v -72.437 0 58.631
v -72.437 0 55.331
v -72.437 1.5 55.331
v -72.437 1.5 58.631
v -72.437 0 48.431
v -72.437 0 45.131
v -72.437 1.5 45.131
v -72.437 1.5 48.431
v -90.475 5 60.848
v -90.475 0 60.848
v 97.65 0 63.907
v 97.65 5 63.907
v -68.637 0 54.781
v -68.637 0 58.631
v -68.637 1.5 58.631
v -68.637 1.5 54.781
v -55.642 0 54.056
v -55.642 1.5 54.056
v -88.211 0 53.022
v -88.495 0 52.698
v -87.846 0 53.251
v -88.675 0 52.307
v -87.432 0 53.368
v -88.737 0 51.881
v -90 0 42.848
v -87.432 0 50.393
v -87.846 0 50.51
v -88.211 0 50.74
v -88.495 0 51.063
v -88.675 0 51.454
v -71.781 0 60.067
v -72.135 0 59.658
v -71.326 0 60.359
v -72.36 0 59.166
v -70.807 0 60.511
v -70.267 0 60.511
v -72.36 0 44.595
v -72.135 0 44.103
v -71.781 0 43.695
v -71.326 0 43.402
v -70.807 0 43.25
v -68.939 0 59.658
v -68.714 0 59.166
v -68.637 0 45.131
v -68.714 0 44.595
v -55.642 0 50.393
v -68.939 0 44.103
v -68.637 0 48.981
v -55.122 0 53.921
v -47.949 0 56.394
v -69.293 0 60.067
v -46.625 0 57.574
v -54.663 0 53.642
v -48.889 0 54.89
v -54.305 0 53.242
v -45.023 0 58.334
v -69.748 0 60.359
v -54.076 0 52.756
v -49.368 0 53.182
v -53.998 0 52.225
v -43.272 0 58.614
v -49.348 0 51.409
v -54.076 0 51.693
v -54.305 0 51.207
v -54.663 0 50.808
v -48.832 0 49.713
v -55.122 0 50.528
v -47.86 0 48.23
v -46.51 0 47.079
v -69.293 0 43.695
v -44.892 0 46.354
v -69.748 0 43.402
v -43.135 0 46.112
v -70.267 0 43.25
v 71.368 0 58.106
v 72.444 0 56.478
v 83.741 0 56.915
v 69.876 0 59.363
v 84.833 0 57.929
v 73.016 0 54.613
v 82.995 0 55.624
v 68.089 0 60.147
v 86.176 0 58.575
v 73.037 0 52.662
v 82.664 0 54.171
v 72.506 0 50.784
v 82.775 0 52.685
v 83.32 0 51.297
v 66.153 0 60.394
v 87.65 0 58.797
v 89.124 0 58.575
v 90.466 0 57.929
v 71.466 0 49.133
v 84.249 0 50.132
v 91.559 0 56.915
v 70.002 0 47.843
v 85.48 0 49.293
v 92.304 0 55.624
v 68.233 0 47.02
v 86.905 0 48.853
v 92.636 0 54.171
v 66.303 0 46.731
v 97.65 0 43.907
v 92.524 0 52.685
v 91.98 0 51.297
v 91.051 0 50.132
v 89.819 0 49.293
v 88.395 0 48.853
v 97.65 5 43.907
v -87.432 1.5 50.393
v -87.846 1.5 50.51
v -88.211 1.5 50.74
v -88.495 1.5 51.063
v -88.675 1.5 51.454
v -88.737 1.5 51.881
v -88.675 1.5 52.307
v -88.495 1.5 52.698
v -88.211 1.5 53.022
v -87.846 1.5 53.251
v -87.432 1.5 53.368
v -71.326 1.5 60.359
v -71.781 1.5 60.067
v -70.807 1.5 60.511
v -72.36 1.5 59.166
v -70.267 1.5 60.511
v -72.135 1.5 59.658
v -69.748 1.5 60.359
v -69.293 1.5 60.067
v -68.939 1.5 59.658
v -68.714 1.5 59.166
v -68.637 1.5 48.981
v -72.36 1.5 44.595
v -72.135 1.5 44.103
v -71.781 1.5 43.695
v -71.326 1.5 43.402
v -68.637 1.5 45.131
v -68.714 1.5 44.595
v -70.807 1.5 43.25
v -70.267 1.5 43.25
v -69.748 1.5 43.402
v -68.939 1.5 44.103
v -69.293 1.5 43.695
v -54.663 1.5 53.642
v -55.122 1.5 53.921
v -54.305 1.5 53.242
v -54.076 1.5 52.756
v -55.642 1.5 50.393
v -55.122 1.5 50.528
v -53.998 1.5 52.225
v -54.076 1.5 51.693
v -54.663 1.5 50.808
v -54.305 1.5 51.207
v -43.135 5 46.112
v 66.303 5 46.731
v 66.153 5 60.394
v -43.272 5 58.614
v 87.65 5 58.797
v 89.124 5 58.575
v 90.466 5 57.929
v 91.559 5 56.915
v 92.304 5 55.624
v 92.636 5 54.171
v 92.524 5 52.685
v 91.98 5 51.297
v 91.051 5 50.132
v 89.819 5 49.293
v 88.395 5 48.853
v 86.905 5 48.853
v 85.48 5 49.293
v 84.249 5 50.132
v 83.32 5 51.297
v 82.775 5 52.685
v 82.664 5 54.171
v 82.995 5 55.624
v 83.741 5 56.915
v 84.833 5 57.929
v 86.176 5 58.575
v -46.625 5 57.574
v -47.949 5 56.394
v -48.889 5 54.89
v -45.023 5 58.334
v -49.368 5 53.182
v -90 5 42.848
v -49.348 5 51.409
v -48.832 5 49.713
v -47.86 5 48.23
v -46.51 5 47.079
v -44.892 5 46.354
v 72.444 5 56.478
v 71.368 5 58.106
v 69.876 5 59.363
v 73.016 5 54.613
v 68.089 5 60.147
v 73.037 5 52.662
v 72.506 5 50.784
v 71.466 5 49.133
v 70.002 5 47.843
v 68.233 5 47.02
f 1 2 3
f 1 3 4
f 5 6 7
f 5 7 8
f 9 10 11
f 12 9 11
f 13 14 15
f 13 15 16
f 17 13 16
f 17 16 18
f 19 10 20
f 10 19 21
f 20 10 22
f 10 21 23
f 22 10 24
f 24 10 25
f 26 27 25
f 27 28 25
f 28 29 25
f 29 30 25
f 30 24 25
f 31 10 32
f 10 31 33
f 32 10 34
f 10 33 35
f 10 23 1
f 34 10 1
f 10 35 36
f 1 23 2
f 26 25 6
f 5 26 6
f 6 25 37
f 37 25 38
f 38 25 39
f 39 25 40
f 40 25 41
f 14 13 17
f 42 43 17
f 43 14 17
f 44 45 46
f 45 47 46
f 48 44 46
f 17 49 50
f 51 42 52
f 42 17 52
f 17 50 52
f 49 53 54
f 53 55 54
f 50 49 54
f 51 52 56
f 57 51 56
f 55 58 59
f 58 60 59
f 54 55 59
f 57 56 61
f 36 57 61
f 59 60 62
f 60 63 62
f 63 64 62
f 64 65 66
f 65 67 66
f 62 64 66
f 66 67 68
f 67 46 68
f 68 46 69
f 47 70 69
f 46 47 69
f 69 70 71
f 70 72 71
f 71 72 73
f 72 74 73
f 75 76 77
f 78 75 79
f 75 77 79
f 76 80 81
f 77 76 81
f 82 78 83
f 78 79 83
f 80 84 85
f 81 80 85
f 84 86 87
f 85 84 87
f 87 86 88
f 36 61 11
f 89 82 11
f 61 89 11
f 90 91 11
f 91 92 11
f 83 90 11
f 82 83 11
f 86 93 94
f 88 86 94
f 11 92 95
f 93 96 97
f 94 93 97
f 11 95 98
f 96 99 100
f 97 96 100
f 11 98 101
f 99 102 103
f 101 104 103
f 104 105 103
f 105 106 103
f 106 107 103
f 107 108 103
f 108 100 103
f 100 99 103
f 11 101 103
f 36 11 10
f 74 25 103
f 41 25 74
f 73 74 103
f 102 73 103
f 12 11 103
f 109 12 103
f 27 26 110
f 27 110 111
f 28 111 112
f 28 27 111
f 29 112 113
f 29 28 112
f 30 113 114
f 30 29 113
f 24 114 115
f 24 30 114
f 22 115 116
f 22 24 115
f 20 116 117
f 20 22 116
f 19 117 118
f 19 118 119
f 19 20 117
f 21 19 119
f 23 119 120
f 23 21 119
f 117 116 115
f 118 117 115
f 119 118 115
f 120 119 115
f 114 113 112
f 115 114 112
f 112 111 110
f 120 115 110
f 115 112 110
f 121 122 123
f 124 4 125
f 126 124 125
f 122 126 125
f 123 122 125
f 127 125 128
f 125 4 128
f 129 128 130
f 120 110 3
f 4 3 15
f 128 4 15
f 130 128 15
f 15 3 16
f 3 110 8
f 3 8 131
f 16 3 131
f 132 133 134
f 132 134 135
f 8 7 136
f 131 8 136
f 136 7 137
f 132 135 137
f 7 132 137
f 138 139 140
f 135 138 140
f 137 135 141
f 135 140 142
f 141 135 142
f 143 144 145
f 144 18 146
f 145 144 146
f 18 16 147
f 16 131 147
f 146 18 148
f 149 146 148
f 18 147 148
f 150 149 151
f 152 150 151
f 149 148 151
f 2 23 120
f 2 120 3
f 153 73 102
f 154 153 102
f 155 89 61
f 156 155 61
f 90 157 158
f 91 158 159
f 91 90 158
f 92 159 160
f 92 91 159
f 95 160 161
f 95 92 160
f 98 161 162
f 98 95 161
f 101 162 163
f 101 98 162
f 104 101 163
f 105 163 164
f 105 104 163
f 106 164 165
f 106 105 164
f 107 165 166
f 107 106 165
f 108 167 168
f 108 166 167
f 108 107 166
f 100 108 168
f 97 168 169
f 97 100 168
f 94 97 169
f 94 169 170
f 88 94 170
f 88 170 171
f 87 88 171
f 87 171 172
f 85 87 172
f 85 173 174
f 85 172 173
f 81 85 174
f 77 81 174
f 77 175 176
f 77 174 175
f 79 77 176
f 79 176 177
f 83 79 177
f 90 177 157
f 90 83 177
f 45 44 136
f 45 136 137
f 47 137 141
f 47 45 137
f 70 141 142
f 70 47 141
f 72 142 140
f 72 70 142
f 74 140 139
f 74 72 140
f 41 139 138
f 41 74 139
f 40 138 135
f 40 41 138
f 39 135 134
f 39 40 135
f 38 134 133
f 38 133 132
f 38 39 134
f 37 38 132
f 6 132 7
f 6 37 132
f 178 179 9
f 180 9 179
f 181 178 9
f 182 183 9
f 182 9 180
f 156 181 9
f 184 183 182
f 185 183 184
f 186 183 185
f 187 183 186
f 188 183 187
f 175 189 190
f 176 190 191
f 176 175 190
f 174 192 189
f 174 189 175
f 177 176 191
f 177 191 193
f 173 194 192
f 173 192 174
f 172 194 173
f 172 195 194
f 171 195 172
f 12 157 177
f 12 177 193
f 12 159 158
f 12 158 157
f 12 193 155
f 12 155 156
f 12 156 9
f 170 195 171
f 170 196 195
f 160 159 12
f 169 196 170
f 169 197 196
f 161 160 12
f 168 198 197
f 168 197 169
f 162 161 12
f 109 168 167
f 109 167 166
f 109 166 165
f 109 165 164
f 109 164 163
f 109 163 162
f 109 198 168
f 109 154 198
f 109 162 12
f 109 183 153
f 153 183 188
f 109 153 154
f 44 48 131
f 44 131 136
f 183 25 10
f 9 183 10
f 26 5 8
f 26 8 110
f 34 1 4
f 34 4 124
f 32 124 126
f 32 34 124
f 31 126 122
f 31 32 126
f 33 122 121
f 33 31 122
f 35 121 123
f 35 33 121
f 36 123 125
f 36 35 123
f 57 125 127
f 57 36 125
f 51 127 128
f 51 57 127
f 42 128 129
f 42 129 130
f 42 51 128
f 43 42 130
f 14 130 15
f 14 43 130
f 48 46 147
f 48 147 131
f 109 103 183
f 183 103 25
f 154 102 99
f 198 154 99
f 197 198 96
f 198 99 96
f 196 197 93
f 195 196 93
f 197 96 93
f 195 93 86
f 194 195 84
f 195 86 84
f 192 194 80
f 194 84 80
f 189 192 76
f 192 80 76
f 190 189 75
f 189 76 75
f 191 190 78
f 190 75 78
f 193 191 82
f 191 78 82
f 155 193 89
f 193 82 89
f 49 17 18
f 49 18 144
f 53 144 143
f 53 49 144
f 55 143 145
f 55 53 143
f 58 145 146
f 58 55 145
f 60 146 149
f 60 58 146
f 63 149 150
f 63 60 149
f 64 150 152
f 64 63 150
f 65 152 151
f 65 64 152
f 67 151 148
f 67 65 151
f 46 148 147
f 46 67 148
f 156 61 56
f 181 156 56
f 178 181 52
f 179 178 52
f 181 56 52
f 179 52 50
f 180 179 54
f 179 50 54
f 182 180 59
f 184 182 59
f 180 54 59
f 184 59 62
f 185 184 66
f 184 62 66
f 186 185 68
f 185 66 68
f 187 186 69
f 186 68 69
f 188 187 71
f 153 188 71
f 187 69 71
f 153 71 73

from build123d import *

# Parameters (mm, degrees)
BOSS_EXTRUDE1_DEPTH = 5
CUT_EXTRUDE1_DEPTH  = 1.5
CUT_EXTRUDE2_DEPTH  = 117.810049896
SKETCH1_11_R        = 5
CUT_EXTRUDE4_DEPTH  = 117.810049896


with BuildPart() as part:
    # Sketch1 → Boss-Extrude1 (new body)
    with BuildSketch(Plane(origin=(0, 0, 0), x_dir=(1, 0, 0), z_dir=(0, 1, 0))):
        Polygon((-89.9999746, -42.847712915), (-90.474893649, -60.847712915), (97.64978611, -63.907018624), (97.64978611, -43.907018893), align=None)
    extrude(amount=BOSS_EXTRUDE1_DEPTH)

    # Sketch1<7> → Cut-Extrude1 (cut)
    with BuildSketch(Plane(origin=(0, 0, 0), x_dir=(1, 0, 0), z_dir=(0, 1, 0))):
        with BuildLine():
            Line((-72.436927027, -45.130599461), (-72.436927027, -48.430599461))
            Line((-72.436927027, -48.430599461), (-87.431604768, -50.393286254))
            ThreePointArc((-87.431604768, -50.393286254), (-88.736927027, -51.880599461), (-87.431604768, -53.367912669))
            Line((-87.431604768, -53.367912669), (-72.436927027, -55.330599461))
            Line((-72.436927027, -55.330599461), (-72.436927027, -58.630599461))
            ThreePointArc((-72.436927027, -58.630599461), (-70.536927027, -60.530599461), (-68.636927027, -58.630599461))
            Line((-68.636927027, -58.630599461), (-68.636927027, -54.780599461))
            Line((-68.636927027, -54.780599461), (-55.641618403, -54.056431677))
            ThreePointArc((-55.641618403, -54.056431677), (-53.998192666, -52.22471247), (-55.641618403, -50.392993263))
            Line((-55.641618403, -50.392993263), (-68.636927027, -48.980599461))
            Line((-68.636927027, -48.980599461), (-68.636927027, -45.130599461))
            ThreePointArc((-68.636927027, -45.130599461), (-70.536927027, -43.230599461), (-72.436927027, -45.130599461))
        make_face()
    extrude(amount=CUT_EXTRUDE1_DEPTH, mode=Mode.SUBTRACT)

    # Sketch1<9> → Cut-Extrude2 (cut, through all)
    with BuildSketch(Plane(origin=(0, 0, 0), x_dir=(1, 0, 0), z_dir=(0, 1, 0))):
        with BuildLine():
            Line((-43.135065573, -46.112318891), (66.303161817, -46.73083337))
            ThreePointArc((66.303161817, -46.73083337), (73.096439635, -53.63791869), (66.153429754, -60.394424507))
            Line((66.153429754, -60.394424507), (-43.272048174, -58.614120743))
            ThreePointArc((-43.272048174, -58.614120743), (-49.421343824, -52.295091347), (-43.135065573, -46.112318891))
        make_face()
    extrude(amount=CUT_EXTRUDE2_DEPTH, mode=Mode.SUBTRACT)

    # Sketch1<11> → Cut-Extrude4 (cut, through all)
    with BuildSketch(Plane(origin=(0, 0, 0), x_dir=(1, 0, 0), z_dir=(0, 1, 0))):
        with Locations(Location((87.64978611, -53.797415464, 0), (0, 0, 270))):
            Circle(SKETCH1_11_R)
    extrude(amount=CUT_EXTRUDE4_DEPTH, mode=Mode.SUBTRACT)


solid = part.part
